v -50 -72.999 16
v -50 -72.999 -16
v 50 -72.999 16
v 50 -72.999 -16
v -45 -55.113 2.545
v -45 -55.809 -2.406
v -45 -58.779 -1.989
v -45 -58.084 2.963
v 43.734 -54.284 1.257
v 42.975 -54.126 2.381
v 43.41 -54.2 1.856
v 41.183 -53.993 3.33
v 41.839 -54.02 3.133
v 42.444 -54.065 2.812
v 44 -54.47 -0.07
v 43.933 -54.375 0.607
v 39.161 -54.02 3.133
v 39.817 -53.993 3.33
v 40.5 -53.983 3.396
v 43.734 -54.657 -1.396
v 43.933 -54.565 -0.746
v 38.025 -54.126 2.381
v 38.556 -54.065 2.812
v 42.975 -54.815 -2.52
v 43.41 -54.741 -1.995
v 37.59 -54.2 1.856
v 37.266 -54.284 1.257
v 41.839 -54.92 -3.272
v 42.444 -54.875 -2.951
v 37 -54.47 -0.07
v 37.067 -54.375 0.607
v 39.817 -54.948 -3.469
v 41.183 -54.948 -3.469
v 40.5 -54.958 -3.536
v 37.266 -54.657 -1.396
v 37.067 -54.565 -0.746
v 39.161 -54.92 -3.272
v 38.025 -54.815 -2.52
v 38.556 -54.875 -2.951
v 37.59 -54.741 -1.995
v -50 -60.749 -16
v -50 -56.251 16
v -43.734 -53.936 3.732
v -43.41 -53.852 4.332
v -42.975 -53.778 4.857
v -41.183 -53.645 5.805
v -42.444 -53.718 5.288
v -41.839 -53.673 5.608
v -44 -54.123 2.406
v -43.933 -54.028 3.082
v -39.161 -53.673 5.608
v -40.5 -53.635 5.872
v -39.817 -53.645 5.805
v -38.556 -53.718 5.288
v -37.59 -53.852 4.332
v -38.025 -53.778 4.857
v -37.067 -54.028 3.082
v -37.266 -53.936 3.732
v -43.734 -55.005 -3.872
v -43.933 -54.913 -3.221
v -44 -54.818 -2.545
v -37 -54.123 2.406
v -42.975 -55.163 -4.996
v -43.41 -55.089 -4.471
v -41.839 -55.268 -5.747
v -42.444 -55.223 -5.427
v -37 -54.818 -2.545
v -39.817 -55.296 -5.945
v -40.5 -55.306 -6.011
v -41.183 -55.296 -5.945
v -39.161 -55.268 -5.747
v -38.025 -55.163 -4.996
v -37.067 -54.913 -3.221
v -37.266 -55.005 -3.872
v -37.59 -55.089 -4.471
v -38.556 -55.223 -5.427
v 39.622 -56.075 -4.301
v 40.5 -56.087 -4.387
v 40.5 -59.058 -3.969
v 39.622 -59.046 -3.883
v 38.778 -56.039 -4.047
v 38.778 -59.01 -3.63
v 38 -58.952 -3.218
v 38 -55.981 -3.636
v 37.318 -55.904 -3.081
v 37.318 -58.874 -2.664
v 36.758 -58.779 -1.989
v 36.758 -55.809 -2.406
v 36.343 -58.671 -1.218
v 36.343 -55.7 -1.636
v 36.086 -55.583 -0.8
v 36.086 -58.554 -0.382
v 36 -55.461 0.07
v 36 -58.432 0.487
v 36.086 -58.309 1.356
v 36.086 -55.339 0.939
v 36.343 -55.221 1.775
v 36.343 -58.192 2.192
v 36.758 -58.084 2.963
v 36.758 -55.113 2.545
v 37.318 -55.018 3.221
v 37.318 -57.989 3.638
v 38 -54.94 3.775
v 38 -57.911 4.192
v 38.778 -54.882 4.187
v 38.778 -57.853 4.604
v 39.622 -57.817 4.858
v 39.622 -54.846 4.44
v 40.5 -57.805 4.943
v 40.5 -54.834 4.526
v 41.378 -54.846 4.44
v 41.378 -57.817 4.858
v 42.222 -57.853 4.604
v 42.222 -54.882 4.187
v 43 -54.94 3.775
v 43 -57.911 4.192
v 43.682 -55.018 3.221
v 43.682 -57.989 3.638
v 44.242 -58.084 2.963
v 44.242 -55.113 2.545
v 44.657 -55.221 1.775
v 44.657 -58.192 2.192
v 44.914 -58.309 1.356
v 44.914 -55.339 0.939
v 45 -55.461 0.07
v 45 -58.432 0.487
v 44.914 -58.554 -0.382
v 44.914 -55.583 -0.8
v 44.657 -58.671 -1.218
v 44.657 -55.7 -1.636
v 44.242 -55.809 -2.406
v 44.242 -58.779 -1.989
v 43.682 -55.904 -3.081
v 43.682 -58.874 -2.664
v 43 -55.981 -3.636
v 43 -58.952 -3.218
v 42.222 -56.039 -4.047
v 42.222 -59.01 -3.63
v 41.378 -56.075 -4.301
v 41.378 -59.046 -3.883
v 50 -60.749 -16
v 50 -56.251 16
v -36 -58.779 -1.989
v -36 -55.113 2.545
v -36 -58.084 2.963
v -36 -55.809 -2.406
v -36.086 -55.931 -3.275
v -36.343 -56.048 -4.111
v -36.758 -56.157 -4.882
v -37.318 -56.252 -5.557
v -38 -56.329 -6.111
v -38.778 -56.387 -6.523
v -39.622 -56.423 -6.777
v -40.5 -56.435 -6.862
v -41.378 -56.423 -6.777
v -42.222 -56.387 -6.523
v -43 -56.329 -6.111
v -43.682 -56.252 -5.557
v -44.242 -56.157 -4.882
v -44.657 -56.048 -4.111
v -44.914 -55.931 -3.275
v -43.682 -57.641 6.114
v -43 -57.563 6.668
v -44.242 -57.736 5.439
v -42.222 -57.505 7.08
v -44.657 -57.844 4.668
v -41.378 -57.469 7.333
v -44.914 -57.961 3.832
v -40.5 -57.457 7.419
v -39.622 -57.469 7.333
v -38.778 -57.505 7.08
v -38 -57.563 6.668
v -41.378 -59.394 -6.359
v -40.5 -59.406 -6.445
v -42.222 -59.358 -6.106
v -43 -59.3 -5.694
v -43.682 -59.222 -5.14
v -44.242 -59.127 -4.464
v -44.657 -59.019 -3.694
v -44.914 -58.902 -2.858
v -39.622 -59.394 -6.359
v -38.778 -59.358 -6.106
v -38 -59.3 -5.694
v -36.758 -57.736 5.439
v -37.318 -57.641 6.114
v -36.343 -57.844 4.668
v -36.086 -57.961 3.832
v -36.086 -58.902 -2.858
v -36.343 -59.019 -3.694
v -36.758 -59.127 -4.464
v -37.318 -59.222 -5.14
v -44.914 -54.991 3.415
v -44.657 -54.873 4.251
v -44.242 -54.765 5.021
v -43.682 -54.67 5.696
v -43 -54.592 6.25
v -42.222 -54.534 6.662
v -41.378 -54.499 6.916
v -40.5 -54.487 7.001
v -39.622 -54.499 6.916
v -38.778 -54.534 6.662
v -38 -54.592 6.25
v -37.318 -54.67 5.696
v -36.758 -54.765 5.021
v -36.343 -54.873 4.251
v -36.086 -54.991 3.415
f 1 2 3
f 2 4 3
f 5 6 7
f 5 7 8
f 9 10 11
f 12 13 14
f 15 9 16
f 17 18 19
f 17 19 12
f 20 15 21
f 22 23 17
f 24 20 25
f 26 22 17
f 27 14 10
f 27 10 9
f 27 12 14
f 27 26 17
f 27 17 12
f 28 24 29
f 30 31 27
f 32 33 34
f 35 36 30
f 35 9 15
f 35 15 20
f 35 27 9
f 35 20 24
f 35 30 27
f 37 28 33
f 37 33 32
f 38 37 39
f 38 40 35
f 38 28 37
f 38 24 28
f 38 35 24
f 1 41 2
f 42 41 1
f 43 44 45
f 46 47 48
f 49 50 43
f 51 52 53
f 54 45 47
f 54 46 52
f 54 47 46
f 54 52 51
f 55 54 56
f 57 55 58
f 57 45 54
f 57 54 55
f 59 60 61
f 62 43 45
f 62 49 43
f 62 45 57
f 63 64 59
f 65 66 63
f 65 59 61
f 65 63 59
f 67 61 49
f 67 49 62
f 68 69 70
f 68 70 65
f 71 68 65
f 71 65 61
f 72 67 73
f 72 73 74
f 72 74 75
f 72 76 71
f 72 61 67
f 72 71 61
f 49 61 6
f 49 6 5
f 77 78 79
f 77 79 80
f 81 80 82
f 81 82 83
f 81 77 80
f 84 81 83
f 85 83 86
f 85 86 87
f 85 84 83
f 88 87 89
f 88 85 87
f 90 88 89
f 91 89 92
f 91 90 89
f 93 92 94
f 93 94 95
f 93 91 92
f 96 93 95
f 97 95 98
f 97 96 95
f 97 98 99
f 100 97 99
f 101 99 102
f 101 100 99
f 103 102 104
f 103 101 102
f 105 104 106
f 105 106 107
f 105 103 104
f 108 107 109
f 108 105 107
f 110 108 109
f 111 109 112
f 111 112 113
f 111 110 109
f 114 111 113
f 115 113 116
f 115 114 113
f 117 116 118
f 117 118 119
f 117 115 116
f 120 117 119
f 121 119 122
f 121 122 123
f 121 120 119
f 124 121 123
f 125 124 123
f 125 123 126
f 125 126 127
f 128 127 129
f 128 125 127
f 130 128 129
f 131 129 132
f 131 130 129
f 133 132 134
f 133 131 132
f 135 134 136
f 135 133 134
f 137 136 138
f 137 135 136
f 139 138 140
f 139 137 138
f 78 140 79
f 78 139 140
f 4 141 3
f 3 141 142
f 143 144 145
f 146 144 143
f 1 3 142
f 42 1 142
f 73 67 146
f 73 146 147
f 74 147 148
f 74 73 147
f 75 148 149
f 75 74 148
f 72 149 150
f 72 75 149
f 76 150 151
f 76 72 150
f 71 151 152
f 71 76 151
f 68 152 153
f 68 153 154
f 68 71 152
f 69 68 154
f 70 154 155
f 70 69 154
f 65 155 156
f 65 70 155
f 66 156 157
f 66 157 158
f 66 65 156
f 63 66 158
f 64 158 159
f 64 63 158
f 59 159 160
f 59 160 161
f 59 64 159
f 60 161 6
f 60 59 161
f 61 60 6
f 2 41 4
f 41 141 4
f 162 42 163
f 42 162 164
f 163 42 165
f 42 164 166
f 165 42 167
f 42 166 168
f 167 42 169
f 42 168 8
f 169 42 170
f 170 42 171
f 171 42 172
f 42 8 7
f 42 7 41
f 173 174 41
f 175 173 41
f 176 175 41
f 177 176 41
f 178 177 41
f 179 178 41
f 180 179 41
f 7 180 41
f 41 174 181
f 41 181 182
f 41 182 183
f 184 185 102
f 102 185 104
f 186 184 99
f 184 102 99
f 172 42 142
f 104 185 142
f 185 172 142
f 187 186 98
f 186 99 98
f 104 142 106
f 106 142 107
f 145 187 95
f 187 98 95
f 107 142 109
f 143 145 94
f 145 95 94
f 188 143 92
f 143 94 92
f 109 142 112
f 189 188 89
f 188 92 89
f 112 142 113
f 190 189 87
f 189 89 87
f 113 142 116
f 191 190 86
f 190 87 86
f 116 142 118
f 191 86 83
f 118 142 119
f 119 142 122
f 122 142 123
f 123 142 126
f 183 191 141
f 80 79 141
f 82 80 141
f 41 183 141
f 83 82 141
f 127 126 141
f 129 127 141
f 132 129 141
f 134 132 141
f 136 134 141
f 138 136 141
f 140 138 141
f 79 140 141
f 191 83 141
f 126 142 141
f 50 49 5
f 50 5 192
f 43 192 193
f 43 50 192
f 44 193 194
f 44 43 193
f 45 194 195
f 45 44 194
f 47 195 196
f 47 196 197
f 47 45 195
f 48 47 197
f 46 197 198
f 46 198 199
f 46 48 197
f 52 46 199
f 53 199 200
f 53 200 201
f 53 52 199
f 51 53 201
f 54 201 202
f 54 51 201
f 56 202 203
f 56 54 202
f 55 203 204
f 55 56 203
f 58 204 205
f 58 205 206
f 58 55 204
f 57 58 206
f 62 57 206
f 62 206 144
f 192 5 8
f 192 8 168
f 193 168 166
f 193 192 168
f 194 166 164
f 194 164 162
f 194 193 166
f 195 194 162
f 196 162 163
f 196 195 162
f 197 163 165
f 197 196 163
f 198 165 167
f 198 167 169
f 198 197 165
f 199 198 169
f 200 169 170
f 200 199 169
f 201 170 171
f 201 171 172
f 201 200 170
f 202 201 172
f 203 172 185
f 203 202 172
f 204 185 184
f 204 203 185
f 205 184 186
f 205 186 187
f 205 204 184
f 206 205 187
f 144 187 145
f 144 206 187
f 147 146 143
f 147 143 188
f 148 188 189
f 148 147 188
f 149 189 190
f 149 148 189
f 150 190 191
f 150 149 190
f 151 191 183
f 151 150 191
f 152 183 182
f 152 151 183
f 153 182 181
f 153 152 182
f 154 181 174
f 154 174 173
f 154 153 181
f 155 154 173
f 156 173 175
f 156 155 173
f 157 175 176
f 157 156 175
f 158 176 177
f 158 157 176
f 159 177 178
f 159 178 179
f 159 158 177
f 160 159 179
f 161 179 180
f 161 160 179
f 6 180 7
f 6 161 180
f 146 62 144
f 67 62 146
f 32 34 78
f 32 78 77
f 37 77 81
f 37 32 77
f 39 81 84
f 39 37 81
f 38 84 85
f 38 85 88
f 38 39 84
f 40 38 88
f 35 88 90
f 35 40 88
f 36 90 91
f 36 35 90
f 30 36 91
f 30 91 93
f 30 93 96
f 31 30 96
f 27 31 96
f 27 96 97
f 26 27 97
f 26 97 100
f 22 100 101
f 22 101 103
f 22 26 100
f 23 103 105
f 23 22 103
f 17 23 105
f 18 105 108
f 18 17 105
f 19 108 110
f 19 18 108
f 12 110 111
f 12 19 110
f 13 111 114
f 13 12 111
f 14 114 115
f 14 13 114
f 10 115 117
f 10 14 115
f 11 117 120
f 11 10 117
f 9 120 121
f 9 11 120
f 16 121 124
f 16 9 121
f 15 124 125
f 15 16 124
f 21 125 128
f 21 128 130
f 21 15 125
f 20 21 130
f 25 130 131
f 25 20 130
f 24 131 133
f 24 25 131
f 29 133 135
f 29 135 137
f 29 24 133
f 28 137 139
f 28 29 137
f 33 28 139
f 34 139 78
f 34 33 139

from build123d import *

# Parameters (mm, degrees)
EXTRUDE_1_DEPTH     = 16
CUT_EXTRUDE_1_DEPTH = 50
EXTRUDE_2_DEPTH     = 28.5
SKETCH_4_R          = 4.5
CUT_EXTRUDE_2_DEPTH = 28.5
EXTRUDE_3_DEPTH     = 50
EXTRUDE_START       = 4
SKETCH_6_R          = 4.5
EXTRUDE_4_DEPTH     = 4
CUT_EXTRUDE_3_DEPTH = 60
CHAMFER_1_SIZE      = 1


with BuildPart() as part:
    # 草图1 → 凸台-拉伸1 (new, symmetric)
    with BuildSketch(Plane.XY):
        with BuildLine():
            Line((-17, -12.990381057), (-17, -66.86388681))
            Line((-17, -66.86388681), (-20.5, -66.86388681))
            Line((-20.5, -66.86388681), (-20.5, -12.990381057))
            ThreePointArc((-20.5, -12.990381057), (-17.809307341, -9.210736327), (-13.357142857, -10.51602276))
            ThreePointArc((-13.357142857, -10.51602276), (0, -17), (13.357142857, -10.51602276))
            ThreePointArc((13.357142857, -10.51602276), (17.809307341, -9.210736327), (20.5, -12.990381057))
            Line((20.5, -12.990381057), (20.5, -66.86388681))
            Line((20.5, -66.86388681), (17, -66.86388681))
            Line((17, -66.86388681), (17, -12.990381057))
            ThreePointArc((17, -12.990381057), (16.663663418, -12.517925466), (16.107142857, -12.68108627))
            ThreePointArc((16.107142857, -12.68108627), (0, -20.5), (-16.107142857, -12.68108627))
            ThreePointArc((-16.107142857, -12.68108627), (-16.663663418, -12.517925466), (-17, -12.990381057))
        make_face()
    extrude(amount=EXTRUDE_1_DEPTH, both=True)

    # 草图2 → 切除-拉伸1 (cut, symmetric)
    with BuildSketch(Plane(origin=(0, 0, 0), x_dir=(0, 0, -1), z_dir=(1, 0, 0))):
        Polygon((16, -60.748653355), (-16, -56.251346645), (-16, -66.86388681), (16, -66.86388681), align=None)
    extrude(amount=CUT_EXTRUDE_1_DEPTH, both=True, mode=Mode.SUBTRACT)

    # 草图3 → 凸台-拉伸2 (add)
    with BuildSketch(Plane.ZY.offset(20.5)):
        Polygon((-16, -60.748653355), (16, -56.251346645), (16, -52.716950141), (-16, -57.214256851), align=None)
    extrude_2 = extrude(amount=EXTRUDE_2_DEPTH)

    # 镜向1: 凸台-拉伸2 across plane
    add(extrude_2.mirror(Plane(origin=(0, 0, 0), x_dir=(0, 0, 1), z_dir=(1, 0, 0))))

    # 草图4 → 切除-拉伸2 (cut)
    with BuildSketch(Plane(origin=(0, -53.900966366, 7.575286804), x_dir=(1, 0, 0), z_dir=(0, 0.9902680687415715, -0.13917310096005808))):
        with Locations(Location((40.5, 7.649733485, 0), (0, 0, 270))):
            Circle(SKETCH_4_R)
        with BuildLine():
            Line((-36, 10.149733485), (-36, 5.149733485))
            ThreePointArc((-36, 5.149733485), (-40.5, 0.649733485), (-45, 5.149733485))
            Line((-45, 5.149733485), (-45, 10.149733485))
            ThreePointArc((-45, 10.149733485), (-40.5, 14.649733485), (-36, 10.149733485))
        make_face()
    extrude(amount=-CUT_EXTRUDE_2_DEPTH, mode=Mode.SUBTRACT)

    # 草图7 → 切除-拉伸3 (cut, symmetric)
    with BuildSketch(Plane(origin=(0, 0, 0), x_dir=(0, 0, -1), z_dir=(1, 0, 0))):
        Polygon((16, -60.748653355), (-16, -56.251346645), (-16, 0), (16, 0), align=None)
    extrude(amount=CUT_EXTRUDE_3_DEPTH, both=True, mode=Mode.SUBTRACT)


with BuildPart() as body_2:
    # 草图5 → 凸台-拉伸3 (new, symmetric)
    with BuildSketch(Plane(origin=(0, 0, 0), x_dir=(0, 0, -1), z_dir=(1, 0, 0))):
        Polygon((-16, -56.251346645), (16, -60.748653355), (16, -72.998653355), (-16, -72.998653355), align=None)
    extrude(amount=EXTRUDE_3_DEPTH, both=True)

    # 草图6 → 凸台-拉伸4 (add)
    with BuildSketch(Plane(origin=(0, -57.366904606, 8.062392658), x_dir=(1, 0, 0), z_dir=(0, 0.9902680687415714, -0.13917310096005842)).offset(EXTRUDE_START)):
        with Locations(Location((40.5, 7.649733485, 0), (0, 0, 90))):
            Circle(SKETCH_6_R)
        with BuildLine():
            Line((-36, 5.149733485), (-36, 10.149733485))
            ThreePointArc((-36, 10.149733485), (-40.5, 14.649733485), (-45, 10.149733485))
            Line((-45, 10.149733485), (-45, 5.149733485))
            ThreePointArc((-45, 5.149733485), (-40.5, 0.649733485), (-36, 5.149733485))
        make_face()
    extrude(amount=-EXTRUDE_4_DEPTH)

    # 倒角1
    chamfer_1_edges = [body_2.edges().sort_by_distance(p)[0] for p in [
        (-40.5, -55.444681169, -7.001463032),
        (-45, -54.470469462, -0.06958655),
        (-40.5, -53.496257755, 6.862289931),
        (-36, -54.470469462, -0.06958655),
        (40.5, -53.844190507, 4.386619759),
    ]]
    chamfer(chamfer_1_edges, length=CHAMFER_1_SIZE)


solid = body_2.part
